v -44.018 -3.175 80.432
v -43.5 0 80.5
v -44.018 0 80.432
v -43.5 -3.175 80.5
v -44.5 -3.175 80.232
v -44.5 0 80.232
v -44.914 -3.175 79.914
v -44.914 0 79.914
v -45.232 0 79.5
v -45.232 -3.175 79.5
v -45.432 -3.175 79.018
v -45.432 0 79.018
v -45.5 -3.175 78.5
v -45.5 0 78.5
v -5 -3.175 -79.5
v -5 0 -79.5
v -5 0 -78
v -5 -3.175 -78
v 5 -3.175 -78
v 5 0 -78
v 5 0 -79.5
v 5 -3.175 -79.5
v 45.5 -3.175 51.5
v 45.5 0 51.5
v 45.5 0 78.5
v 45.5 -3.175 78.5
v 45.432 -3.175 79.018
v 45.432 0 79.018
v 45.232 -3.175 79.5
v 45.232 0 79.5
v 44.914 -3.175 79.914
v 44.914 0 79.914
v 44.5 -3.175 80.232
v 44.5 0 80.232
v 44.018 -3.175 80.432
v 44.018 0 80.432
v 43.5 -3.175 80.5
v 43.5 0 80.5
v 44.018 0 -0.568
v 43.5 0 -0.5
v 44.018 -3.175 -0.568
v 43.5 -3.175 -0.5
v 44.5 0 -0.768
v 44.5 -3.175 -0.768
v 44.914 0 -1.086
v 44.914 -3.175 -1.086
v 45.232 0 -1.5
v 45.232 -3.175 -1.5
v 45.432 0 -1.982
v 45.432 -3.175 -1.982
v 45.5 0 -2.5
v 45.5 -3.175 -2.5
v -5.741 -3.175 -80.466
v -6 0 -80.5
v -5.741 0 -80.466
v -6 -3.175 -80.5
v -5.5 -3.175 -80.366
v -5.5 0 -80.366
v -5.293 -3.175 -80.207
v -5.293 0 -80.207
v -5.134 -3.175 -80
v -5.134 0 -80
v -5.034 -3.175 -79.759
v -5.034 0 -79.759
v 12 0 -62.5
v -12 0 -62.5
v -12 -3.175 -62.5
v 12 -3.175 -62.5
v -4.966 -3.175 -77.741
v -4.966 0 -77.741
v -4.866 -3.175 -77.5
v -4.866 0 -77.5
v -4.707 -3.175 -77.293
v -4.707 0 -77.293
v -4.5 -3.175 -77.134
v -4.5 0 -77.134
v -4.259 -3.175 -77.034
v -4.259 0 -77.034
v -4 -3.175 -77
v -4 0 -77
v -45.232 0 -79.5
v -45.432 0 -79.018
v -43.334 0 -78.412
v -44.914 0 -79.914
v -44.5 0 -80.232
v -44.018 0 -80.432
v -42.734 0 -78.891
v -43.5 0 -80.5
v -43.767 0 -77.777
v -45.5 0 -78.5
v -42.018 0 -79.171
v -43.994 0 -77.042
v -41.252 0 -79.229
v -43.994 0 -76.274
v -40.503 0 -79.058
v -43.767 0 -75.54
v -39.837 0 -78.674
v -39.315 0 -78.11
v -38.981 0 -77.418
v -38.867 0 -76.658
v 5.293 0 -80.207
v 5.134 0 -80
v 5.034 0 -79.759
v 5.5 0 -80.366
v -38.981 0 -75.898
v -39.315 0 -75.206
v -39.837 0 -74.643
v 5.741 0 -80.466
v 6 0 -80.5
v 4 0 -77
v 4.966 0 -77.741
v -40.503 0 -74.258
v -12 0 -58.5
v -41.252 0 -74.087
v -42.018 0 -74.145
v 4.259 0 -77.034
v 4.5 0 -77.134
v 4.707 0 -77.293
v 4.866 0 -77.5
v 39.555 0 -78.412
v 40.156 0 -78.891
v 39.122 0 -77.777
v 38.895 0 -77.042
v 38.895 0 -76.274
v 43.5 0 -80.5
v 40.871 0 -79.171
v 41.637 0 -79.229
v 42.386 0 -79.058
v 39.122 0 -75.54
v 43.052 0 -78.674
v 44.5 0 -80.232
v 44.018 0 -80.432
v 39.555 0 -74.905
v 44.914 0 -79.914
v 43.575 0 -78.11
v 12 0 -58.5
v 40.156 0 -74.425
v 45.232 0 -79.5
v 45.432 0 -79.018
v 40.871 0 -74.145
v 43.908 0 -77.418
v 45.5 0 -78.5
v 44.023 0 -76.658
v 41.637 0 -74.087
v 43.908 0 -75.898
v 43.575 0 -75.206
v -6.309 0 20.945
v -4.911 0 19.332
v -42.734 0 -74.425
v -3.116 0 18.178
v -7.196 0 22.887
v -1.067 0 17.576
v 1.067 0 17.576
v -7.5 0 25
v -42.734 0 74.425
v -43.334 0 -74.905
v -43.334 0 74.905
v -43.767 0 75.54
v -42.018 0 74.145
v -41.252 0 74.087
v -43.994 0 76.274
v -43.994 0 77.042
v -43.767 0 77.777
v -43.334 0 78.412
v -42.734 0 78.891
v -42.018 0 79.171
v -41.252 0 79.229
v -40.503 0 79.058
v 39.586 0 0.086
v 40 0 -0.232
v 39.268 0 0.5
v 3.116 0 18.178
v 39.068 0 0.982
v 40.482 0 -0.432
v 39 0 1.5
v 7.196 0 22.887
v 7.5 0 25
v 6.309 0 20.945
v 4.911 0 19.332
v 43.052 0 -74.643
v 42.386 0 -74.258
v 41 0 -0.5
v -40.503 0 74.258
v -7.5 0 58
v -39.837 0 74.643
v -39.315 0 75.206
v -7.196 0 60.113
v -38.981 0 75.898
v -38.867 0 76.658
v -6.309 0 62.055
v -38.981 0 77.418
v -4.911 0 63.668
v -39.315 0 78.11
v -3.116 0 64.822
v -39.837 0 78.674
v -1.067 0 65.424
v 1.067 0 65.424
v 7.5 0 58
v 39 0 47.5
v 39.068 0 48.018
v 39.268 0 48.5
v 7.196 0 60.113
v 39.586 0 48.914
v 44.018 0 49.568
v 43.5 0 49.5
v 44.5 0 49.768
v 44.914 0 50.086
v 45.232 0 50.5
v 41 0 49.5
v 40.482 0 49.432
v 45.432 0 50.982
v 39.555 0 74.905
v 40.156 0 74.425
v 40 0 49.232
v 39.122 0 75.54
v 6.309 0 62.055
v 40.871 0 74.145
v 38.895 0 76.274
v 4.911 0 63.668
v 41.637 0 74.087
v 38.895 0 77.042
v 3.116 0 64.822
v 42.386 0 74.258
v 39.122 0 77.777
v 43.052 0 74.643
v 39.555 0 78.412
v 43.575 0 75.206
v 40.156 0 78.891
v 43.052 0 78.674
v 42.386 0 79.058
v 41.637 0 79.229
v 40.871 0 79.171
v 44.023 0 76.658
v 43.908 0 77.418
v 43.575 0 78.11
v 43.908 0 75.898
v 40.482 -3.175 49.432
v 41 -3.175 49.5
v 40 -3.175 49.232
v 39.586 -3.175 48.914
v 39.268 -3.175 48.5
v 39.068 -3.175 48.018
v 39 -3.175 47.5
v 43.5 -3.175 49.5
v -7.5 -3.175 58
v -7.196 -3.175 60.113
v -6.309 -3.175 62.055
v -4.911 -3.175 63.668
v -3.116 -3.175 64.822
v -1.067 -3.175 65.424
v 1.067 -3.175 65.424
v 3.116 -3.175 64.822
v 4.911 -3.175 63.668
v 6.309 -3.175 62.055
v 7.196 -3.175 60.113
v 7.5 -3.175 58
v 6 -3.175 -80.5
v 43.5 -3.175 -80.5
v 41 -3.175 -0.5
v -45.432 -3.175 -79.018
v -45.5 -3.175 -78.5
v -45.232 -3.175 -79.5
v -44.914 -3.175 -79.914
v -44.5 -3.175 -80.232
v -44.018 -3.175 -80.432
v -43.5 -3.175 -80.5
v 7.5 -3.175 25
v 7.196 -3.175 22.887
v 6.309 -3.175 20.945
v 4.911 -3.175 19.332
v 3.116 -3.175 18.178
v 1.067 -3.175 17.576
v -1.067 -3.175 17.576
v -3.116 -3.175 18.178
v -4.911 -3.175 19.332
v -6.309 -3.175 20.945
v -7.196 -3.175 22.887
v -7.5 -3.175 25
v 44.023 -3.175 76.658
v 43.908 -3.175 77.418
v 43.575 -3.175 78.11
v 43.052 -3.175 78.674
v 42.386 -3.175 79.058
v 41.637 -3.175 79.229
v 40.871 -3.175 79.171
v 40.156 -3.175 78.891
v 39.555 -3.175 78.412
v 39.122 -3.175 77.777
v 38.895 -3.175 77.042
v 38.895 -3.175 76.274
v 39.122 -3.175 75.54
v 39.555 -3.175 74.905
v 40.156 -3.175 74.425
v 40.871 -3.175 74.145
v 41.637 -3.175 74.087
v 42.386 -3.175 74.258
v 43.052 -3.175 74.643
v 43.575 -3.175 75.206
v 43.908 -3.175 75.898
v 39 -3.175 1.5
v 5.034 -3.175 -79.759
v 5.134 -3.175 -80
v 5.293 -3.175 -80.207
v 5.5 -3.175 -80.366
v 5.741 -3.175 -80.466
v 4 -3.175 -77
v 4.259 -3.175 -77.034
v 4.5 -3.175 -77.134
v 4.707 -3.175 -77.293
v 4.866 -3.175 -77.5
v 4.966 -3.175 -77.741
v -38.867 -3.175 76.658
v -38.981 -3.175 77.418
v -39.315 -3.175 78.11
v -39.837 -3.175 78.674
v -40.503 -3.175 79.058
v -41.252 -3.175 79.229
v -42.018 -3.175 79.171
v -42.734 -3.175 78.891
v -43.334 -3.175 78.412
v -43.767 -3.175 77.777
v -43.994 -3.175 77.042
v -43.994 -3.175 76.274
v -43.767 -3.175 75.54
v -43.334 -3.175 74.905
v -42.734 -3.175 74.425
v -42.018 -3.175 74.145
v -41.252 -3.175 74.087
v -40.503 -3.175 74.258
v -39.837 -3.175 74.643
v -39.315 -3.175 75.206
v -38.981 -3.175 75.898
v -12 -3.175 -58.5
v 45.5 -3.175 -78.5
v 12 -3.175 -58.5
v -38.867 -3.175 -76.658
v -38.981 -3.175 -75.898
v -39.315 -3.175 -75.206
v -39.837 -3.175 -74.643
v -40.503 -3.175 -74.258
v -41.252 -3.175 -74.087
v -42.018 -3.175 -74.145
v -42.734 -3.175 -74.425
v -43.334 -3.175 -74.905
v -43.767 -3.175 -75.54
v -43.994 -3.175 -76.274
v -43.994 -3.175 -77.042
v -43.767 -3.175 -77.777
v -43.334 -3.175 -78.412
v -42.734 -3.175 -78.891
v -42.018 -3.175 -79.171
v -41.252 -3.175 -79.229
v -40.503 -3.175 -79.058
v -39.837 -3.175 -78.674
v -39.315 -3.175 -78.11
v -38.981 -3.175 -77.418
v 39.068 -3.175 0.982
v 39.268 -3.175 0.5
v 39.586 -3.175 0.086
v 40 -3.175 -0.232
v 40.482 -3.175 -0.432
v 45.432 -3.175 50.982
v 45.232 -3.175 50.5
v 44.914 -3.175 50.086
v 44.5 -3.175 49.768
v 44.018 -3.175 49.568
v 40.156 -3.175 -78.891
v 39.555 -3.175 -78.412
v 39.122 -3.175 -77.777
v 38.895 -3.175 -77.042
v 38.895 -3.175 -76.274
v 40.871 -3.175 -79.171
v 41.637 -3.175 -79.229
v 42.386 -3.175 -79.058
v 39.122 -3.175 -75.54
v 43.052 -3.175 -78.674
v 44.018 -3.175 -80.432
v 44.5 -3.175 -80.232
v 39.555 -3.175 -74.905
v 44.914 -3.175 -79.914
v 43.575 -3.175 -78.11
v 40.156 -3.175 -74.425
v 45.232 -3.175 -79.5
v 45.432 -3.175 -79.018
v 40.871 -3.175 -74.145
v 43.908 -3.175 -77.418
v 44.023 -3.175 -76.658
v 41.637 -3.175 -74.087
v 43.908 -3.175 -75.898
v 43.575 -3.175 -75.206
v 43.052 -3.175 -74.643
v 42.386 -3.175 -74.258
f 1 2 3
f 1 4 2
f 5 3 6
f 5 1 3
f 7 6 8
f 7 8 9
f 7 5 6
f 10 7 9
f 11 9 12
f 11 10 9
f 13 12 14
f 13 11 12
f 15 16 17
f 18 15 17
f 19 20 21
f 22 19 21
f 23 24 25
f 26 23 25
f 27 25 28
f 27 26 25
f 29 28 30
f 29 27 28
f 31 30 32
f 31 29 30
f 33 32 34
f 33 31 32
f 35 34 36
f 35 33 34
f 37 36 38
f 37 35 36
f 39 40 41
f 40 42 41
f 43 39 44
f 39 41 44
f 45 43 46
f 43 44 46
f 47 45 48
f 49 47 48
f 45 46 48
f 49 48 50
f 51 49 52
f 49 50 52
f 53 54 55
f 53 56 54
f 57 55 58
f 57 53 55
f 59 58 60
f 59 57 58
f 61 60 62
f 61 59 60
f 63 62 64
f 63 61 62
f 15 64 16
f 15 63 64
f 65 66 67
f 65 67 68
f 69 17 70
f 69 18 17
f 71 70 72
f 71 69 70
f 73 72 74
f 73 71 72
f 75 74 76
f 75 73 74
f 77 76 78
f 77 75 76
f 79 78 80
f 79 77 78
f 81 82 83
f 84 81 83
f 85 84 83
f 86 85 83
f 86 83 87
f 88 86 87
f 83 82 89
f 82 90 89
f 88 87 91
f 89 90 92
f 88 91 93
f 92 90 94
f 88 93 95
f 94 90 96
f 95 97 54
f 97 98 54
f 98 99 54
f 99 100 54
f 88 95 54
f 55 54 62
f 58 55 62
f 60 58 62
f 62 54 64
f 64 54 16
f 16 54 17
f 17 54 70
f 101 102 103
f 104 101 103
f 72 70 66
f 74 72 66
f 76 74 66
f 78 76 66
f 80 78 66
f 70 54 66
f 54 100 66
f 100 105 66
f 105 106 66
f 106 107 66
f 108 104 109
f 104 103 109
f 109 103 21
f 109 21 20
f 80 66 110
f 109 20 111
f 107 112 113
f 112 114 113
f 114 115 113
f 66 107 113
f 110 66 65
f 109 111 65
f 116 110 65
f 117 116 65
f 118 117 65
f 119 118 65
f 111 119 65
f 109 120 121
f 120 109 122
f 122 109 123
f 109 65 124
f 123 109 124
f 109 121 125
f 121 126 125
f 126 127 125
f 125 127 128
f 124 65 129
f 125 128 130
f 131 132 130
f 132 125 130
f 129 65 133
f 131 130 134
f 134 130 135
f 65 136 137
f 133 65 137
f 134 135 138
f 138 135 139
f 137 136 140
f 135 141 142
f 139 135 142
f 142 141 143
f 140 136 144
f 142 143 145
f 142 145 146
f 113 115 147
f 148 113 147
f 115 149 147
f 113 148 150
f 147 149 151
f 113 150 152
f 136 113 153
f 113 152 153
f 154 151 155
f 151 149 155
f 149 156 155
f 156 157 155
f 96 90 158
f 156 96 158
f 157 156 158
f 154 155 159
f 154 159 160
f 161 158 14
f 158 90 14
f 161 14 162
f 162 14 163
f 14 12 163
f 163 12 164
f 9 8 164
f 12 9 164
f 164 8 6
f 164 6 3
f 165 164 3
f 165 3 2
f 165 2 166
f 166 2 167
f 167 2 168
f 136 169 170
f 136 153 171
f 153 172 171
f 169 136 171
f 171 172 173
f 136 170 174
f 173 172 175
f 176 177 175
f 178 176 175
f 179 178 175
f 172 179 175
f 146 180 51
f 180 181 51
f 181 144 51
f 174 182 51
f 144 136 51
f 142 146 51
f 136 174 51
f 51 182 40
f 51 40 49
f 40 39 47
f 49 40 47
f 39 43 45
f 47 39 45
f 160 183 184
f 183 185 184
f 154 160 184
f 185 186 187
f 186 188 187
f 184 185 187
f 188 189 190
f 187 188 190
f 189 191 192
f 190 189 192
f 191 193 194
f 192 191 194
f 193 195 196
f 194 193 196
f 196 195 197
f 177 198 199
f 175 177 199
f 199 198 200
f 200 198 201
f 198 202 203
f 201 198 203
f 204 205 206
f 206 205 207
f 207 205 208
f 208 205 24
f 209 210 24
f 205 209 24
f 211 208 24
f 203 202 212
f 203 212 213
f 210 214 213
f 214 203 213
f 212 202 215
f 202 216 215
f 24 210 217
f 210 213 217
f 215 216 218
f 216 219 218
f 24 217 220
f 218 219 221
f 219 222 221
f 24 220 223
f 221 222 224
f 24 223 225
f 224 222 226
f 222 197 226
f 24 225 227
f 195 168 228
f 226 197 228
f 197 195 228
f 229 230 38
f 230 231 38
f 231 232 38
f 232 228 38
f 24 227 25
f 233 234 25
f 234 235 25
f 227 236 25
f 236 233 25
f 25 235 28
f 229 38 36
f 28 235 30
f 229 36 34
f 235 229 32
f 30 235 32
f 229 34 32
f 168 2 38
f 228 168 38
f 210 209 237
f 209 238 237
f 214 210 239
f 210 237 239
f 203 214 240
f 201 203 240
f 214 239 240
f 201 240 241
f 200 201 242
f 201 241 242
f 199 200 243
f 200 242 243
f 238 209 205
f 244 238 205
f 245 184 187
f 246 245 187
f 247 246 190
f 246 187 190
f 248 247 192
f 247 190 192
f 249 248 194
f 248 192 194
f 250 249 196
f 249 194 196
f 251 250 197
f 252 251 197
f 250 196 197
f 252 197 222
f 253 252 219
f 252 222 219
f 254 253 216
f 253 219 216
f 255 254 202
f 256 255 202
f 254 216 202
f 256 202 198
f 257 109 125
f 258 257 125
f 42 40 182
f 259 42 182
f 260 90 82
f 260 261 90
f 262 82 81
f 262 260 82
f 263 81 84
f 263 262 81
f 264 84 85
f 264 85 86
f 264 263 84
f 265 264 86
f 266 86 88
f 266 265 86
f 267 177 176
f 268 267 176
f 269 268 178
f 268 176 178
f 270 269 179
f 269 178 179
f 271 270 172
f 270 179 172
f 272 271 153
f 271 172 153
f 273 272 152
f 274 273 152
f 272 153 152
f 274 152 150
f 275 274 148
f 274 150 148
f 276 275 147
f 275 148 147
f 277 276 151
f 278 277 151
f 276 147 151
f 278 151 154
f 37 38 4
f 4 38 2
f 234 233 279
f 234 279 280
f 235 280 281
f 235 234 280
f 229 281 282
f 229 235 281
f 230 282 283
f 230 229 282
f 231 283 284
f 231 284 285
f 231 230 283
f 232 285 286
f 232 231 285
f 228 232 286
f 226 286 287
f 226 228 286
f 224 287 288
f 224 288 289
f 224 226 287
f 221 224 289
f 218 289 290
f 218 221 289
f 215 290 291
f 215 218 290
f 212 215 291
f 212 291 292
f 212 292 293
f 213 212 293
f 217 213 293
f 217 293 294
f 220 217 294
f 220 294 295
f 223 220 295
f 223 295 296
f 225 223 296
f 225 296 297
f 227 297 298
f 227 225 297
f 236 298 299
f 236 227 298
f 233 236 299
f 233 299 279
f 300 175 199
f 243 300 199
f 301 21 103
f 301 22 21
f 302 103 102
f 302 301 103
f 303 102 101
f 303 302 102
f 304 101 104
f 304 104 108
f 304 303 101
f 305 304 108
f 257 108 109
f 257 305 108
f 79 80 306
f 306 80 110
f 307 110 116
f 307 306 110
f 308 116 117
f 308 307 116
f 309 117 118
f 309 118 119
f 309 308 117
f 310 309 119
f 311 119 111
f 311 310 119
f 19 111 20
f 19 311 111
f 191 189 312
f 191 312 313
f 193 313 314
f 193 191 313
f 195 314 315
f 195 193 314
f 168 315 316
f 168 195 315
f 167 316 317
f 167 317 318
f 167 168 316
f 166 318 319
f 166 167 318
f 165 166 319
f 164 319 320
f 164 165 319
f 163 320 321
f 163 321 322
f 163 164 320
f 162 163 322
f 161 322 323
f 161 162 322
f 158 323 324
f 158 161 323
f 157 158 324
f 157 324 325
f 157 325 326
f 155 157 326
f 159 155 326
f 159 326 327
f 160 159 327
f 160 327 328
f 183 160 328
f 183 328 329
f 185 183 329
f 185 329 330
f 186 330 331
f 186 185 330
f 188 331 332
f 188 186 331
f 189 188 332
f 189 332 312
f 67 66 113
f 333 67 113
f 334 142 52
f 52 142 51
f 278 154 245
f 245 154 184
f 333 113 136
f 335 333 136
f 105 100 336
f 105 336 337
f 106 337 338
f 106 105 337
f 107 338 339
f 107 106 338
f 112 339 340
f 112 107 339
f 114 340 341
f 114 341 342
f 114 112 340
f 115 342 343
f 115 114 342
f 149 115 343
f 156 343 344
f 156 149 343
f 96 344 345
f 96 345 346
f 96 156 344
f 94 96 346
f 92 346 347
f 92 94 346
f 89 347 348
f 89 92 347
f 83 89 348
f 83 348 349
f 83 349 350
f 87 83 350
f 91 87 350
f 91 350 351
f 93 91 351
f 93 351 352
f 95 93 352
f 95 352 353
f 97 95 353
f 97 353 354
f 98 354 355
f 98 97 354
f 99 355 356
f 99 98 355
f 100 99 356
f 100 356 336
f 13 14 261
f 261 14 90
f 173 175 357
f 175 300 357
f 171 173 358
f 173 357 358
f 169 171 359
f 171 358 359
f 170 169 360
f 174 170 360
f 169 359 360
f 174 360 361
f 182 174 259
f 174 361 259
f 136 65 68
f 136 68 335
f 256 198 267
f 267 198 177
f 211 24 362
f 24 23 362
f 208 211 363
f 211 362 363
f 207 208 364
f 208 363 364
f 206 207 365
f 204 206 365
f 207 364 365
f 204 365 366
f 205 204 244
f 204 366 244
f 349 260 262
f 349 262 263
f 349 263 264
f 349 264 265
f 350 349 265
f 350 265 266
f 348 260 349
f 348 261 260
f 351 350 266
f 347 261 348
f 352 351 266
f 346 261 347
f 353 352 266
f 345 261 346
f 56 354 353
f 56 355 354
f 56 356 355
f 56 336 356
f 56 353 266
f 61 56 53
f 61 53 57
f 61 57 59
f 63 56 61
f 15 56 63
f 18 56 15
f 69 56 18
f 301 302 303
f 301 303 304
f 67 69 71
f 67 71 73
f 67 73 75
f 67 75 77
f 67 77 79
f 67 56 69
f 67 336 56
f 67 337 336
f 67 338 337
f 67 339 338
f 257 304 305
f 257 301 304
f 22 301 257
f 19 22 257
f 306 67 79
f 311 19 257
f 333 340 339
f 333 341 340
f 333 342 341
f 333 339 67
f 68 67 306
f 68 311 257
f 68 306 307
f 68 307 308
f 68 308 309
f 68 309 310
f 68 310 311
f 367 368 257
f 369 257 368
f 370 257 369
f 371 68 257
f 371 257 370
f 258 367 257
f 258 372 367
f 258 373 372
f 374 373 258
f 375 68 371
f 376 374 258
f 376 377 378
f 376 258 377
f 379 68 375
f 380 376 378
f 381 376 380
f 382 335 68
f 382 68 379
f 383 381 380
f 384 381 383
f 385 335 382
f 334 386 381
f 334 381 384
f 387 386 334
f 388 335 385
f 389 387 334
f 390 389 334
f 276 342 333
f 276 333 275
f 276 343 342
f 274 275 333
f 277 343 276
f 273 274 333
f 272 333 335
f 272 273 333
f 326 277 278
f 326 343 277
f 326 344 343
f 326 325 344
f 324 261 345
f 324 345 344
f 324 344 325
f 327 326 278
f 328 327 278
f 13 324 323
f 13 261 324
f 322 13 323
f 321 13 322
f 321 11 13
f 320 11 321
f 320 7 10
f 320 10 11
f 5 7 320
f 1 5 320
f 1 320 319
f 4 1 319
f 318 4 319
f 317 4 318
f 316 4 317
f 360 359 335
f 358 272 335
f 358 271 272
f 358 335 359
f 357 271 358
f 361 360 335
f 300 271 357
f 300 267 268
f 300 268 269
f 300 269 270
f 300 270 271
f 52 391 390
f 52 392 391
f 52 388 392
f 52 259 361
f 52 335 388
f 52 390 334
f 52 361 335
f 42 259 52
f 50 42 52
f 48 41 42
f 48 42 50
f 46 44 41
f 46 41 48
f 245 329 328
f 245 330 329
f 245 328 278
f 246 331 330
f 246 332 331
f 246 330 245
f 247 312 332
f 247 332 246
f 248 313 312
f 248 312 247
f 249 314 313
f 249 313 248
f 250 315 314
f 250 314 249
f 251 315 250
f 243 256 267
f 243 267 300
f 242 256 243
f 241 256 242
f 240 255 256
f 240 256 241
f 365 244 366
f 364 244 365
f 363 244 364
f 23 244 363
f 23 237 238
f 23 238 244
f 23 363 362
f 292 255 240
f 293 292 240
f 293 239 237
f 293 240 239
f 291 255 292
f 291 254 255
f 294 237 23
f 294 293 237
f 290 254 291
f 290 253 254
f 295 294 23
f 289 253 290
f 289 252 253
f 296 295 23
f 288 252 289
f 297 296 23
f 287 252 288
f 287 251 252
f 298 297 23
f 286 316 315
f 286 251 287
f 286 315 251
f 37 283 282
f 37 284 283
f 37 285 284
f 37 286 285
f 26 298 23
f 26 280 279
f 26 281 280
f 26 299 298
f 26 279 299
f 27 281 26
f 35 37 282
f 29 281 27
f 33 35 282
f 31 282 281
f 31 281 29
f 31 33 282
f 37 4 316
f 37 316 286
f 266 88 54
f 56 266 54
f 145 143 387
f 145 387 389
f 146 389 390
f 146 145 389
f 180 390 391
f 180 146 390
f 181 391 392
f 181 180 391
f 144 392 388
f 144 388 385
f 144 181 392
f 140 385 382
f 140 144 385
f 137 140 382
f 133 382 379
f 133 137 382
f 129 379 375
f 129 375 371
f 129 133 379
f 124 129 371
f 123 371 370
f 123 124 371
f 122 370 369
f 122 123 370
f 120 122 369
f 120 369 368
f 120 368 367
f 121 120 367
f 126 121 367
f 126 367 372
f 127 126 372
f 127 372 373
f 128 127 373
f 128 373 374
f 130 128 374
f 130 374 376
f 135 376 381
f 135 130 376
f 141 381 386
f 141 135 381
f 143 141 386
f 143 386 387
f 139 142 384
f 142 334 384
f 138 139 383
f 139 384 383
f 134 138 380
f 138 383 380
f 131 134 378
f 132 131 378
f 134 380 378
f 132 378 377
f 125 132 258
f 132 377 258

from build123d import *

# Parameters (mm, degrees)
F1_R     = 2.578
F1_W     = 24
F1_H     = 4
F2_DEPTH = 3.175
F3_R     = 2
F4_R     = 1


# Not quite as in the source:
# - a feature names something its author has since deleted; it is built from what else it names


with BuildPart() as f2:
    # F1 (on Front) → F2 (new body)
    with BuildSketch(Plane.XZ):
        Polygon((45.5, 49.5), (45.5, 80.5), (-45.5, 80.5), (-45.5, -80.5), (-5, -80.5), (-5, -77), (5, -77), (5, -80.5), (45.5, -80.5), (45.5, -0.5), (39, -0.5), (39, 49.5), align=None)
        with Locations((-41.4446451293, -76.6580848593)):
            Circle(F1_R, mode=Mode.SUBTRACT)
        with Locations((0, -60.5)):
            Rectangle(F1_W, F1_H, mode=Mode.SUBTRACT)
        with Locations((41.4446451293, -76.6580848593)):
            Circle(F1_R, mode=Mode.SUBTRACT)
        with Locations((-41.4446451293, 76.6580848593)):
            Circle(F1_R, mode=Mode.SUBTRACT)
        with BuildLine():
            ThreePointArc((-7.5, 58), (0, 65.5), (7.5, 58))
            Line((7.5, 58), (7.5, 25))
            ThreePointArc((7.5, 25), (0, 17.5), (-7.5, 25))
            Line((-7.5, 25), (-7.5, 58))
        make_face(mode=Mode.SUBTRACT)
        with Locations((41.4446451293, 76.6580848593)):
            Circle(F1_R, mode=Mode.SUBTRACT)
    extrude(amount=F2_DEPTH)

    # F3
    f3_edges = [f2.edges().sort_by_distance(p)[0] for p in [
        (-45.5, -1.5875, 80.5),
        (45.5, -1.5875, 80.5),
        (45.5, -1.5875, 49.5),
        (39, -1.5875, 49.5),
        (45.5, -1.5875, -0.5),
        (39, -1.5875, -0.5),
        (-45.5, -1.5875, -80.5),
        (45.5, -1.5875, -80.5),
    ]]
    fillet(f3_edges, radius=F3_R)

    # F4
    f4_edges = [f2.edges().sort_by_distance(p)[0] for p in [
        (5, -1.5875, -80.5),
        (5, -1.5875, -77),
        (-5, -1.5875, -77),
        (-5, -1.5875, -80.5),
    ]]
    fillet(f4_edges, radius=F4_R)


solid = f2.part
